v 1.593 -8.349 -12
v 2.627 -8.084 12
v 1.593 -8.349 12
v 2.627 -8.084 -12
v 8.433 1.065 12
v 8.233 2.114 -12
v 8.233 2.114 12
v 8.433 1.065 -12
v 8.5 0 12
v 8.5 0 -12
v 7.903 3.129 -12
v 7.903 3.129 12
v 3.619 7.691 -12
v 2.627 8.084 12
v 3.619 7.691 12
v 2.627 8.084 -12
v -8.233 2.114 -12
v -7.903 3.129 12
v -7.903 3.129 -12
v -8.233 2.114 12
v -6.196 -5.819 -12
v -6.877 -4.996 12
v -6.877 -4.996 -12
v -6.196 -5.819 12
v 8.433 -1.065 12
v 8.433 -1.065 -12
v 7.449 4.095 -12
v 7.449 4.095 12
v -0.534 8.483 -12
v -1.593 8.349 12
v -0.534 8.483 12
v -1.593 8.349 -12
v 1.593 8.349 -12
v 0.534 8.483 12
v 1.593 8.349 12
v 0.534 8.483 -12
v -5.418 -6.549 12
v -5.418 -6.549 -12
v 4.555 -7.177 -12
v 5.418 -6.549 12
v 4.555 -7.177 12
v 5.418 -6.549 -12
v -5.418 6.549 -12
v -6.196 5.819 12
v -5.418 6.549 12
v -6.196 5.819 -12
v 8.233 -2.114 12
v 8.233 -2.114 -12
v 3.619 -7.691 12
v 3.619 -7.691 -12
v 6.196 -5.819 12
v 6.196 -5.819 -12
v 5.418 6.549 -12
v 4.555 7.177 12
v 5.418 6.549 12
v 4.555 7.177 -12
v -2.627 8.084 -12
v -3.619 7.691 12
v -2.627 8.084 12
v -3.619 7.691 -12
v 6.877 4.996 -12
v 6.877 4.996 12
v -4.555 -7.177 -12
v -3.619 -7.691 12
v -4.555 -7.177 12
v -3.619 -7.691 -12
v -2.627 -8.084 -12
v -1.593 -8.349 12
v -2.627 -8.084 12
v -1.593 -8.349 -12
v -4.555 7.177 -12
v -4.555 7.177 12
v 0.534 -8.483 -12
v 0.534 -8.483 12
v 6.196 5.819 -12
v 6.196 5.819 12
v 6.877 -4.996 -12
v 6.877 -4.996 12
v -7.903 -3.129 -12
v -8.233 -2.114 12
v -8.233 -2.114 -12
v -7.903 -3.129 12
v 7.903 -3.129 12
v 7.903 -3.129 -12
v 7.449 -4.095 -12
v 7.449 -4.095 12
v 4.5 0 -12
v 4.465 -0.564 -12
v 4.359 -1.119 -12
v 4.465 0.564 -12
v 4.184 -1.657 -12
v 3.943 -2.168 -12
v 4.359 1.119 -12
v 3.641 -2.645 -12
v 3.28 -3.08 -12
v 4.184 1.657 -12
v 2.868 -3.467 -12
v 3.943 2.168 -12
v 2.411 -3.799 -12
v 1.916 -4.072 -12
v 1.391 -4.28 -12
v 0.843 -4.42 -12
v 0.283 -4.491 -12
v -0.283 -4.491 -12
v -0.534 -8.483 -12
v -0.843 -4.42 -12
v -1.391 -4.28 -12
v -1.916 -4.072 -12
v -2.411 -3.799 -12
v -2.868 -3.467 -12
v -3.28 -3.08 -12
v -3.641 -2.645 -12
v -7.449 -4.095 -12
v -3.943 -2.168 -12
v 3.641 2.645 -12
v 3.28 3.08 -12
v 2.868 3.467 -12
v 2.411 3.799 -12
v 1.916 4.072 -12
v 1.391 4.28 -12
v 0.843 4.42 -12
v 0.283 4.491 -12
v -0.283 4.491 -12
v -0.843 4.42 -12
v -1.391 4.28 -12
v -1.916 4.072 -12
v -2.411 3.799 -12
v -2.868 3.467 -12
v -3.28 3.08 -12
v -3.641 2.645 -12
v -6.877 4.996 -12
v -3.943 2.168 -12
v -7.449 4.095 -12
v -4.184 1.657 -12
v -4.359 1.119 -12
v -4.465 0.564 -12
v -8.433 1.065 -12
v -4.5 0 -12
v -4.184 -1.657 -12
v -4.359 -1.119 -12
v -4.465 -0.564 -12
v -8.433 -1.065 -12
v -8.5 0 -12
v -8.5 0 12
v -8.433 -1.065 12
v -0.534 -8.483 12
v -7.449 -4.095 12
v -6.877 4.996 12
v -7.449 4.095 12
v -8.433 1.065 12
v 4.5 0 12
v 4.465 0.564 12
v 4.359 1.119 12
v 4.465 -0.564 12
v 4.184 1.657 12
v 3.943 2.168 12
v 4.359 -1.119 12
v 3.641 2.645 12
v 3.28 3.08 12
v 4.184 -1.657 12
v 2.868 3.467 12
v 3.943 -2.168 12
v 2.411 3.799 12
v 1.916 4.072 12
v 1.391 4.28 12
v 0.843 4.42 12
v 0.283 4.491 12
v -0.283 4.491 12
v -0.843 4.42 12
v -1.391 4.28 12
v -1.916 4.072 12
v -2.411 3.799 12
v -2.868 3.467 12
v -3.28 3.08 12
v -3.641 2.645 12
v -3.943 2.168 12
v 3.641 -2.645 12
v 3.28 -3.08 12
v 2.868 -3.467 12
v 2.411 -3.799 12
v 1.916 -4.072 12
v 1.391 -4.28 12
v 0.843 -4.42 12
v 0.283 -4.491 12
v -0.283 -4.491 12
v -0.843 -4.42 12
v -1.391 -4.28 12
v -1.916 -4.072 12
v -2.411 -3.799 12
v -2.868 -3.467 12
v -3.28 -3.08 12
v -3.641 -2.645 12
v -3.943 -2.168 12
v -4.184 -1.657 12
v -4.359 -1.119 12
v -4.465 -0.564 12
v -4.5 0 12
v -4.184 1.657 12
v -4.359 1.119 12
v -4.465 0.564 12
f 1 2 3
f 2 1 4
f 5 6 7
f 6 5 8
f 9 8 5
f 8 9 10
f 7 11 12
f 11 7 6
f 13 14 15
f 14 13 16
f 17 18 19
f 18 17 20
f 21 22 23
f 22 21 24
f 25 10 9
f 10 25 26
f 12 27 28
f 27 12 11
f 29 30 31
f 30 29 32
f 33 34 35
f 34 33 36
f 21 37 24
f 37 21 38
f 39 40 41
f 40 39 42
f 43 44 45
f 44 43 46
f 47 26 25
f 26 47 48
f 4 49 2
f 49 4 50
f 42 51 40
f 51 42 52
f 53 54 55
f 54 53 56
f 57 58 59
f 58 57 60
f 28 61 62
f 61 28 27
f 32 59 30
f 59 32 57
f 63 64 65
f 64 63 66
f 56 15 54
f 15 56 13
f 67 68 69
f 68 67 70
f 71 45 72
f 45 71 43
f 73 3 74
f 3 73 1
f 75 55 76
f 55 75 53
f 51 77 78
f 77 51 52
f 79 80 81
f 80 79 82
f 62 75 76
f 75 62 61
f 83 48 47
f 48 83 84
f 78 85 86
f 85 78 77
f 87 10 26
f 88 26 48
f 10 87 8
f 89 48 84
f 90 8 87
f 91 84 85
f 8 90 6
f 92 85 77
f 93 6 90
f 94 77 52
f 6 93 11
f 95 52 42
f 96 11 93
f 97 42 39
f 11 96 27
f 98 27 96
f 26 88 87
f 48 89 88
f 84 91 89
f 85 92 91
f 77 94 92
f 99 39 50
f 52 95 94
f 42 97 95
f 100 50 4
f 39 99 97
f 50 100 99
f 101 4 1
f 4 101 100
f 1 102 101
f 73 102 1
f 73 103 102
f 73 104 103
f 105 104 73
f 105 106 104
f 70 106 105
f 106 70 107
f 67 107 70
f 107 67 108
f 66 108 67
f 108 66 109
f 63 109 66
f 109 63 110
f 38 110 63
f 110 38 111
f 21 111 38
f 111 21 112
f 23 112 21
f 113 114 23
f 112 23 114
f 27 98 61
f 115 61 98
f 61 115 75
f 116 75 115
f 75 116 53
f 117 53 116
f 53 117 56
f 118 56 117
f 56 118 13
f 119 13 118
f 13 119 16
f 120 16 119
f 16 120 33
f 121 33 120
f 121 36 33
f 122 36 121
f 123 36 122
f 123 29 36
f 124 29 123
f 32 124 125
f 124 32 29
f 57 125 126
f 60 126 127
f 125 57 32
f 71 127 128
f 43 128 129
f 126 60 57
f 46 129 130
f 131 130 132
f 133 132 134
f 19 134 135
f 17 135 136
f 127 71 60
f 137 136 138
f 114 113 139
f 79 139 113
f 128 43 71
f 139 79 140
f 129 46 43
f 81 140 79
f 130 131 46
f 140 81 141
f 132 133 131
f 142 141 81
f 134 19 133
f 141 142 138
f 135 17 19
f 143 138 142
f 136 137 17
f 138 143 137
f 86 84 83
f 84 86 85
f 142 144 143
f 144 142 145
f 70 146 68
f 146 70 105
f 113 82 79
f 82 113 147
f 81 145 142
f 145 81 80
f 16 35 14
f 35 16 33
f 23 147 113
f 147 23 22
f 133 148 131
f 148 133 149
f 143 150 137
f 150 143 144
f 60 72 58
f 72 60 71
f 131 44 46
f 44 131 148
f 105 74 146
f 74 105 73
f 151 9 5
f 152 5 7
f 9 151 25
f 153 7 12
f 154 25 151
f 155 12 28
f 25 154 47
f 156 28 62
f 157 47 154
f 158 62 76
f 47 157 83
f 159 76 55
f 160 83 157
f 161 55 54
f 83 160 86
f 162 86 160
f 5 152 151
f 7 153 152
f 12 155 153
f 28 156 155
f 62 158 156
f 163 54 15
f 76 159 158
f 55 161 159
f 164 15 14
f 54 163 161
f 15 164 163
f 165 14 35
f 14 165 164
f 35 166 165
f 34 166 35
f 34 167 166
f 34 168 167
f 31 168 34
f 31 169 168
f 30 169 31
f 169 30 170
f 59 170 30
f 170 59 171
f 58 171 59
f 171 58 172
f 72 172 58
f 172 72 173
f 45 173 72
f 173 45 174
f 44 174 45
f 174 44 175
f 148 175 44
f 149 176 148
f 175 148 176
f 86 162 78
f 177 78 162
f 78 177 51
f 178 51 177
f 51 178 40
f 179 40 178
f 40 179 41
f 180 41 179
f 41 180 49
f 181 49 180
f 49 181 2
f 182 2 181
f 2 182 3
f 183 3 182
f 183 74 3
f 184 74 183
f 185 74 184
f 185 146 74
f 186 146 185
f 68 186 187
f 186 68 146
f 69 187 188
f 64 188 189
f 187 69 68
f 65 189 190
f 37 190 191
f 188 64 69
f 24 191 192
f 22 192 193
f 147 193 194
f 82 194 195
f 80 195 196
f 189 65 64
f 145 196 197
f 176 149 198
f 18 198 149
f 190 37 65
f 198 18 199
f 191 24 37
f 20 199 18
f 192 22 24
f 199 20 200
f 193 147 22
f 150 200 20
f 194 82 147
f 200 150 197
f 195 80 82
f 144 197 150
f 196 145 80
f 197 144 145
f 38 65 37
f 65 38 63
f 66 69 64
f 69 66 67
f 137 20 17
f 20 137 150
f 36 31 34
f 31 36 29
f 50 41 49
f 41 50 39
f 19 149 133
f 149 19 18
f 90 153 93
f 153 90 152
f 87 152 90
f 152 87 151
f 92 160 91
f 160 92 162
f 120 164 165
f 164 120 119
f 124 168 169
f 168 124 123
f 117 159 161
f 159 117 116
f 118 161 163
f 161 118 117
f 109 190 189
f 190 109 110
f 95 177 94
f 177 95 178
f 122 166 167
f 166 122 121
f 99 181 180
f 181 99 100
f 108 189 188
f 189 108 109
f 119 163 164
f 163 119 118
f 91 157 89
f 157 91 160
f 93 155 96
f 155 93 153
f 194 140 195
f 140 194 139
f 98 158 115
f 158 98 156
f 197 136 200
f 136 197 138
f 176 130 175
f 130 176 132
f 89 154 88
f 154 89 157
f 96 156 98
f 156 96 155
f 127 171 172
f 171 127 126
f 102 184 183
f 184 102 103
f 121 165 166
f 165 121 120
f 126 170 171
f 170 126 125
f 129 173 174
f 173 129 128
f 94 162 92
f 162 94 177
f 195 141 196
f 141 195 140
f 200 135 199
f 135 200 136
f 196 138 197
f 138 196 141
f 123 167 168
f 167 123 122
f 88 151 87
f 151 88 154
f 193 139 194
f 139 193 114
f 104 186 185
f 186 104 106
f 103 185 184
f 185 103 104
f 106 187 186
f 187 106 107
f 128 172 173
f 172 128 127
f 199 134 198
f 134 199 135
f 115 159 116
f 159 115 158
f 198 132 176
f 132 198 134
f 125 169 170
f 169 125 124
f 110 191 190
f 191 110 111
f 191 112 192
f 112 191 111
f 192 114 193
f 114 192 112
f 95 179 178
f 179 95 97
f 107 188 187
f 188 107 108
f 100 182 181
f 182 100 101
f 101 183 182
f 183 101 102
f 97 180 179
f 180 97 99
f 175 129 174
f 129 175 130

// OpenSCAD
$fn = 50;


difference() {
	union() {
		translate(v = [0, 0, -12.0000000000]) {
			cylinder(h = 24, r = 8.5000000000);
		}
	}
	union() {
		translate(v = [0, 0, -100.0000000000]) {
			cylinder(h = 200, r = 4.5000000000);
		}
	}
}
